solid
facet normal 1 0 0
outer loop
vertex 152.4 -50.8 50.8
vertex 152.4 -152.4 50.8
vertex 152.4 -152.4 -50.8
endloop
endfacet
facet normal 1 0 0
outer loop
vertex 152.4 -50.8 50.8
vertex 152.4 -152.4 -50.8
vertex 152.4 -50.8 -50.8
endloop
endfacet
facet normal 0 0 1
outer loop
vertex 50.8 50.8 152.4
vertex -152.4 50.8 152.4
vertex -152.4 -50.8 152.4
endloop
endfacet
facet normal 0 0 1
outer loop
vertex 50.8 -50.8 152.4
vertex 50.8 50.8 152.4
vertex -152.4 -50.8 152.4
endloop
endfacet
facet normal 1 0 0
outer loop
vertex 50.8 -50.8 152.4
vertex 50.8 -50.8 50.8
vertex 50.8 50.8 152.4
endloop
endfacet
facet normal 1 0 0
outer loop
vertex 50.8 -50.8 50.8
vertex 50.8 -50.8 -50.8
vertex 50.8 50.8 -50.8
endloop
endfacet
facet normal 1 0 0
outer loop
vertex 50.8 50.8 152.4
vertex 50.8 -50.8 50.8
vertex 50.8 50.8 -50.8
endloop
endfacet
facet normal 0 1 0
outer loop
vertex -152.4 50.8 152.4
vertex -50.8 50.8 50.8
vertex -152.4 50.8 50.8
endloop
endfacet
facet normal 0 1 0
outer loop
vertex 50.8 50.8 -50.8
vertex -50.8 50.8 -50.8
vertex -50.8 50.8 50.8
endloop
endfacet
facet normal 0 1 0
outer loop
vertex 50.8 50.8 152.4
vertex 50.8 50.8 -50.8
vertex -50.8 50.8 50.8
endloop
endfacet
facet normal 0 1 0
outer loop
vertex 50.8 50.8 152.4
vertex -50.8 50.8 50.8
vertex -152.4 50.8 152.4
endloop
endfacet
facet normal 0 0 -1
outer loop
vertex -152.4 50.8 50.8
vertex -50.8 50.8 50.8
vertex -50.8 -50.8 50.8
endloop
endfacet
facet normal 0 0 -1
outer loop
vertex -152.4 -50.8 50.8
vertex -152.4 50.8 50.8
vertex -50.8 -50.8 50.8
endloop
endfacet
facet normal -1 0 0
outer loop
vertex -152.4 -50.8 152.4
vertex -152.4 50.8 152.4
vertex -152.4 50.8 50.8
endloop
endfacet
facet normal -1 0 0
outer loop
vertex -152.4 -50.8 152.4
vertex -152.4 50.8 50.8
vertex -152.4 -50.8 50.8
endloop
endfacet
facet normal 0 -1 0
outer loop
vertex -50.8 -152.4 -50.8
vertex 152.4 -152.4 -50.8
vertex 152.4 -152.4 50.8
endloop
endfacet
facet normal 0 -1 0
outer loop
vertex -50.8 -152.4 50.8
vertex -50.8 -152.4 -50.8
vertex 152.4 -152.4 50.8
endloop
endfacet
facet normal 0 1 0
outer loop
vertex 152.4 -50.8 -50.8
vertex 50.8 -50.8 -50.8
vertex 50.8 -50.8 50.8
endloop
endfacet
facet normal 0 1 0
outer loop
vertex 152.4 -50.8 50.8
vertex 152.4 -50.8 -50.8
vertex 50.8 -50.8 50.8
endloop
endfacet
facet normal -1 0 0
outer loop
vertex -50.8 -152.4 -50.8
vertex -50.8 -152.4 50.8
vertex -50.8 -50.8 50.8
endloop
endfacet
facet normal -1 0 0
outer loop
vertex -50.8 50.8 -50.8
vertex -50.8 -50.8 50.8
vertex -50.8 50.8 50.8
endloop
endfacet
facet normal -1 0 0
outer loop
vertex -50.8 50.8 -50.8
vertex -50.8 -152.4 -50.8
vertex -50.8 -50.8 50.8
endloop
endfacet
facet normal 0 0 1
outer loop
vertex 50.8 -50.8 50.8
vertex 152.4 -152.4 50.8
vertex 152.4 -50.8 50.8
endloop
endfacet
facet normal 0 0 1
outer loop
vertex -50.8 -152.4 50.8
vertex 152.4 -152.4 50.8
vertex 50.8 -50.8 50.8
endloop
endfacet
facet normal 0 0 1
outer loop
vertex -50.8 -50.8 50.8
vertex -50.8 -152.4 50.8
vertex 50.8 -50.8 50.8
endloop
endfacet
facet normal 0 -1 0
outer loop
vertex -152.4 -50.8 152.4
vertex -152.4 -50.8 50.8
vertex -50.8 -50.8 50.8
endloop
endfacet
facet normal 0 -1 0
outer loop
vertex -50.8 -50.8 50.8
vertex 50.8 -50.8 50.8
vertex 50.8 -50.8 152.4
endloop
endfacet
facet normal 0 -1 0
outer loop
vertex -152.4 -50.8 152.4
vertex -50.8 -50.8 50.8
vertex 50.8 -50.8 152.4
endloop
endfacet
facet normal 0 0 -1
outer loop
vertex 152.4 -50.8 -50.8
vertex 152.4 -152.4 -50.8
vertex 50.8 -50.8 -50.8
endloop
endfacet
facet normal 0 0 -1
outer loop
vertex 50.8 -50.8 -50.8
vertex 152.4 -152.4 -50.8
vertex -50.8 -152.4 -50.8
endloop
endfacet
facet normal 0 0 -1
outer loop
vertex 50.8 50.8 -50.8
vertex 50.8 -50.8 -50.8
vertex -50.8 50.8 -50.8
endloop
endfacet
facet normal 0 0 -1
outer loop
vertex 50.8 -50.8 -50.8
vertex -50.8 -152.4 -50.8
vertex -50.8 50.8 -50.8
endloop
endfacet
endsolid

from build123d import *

# Parameters (mm, degrees)
F1_W      = 101.6
F1_H      = 101.6
F2_DEPTH  = 50.8
F3_W      = 101.6
F3_H      = 101.6
F4_DEPTH  = 101.6
F5_W      = 101.6
F5_H      = 101.6
F6_DEPTH  = 101.6
F7_W      = 101.6
F7_H      = 101.6
F8_DEPTH  = 101.6
F9_W      = 101.6
F9_H      = 101.6
F10_DEPTH = 101.6


# Not quite as in the source:
# - a variable given as a bare number and used for a length is read in inches; the dataset says mm whatever the document's units were


with BuildPart() as f2:
    # F1 (on Front) → F2 (new body, symmetric)
    with BuildSketch(Plane.XZ):
        Rectangle(F1_W, F1_H)
    extrude(amount=F2_DEPTH, both=True)

    # F3 (on face) → F4 (join)
    with BuildSketch(Plane.XZ.offset(50.8)):
        Rectangle(F3_W, F3_H)
    extrude(amount=F4_DEPTH)

    # F5 (on face) → F6 (join)
    with BuildSketch(Plane.YZ.offset(50.8)):
        with Locations((-101.6, 0)):
            Rectangle(F5_W, F5_H)
    extrude(amount=F6_DEPTH)

    # F7 (on face) → F8 (join)
    with BuildSketch(Plane.XY.offset(50.8)):
        Rectangle(F7_W, F7_H)
    extrude(amount=F8_DEPTH)

    # F9 (on face) → F10 (join)
    with BuildSketch(Plane(origin=(-50.8, 0, 0), x_dir=(0, -1, 0), z_dir=(-1, 0, 0))):
        with Locations((0, 101.6)):
            Rectangle(F9_W, F9_H)
    extrude(amount=F10_DEPTH)


solid = f2.part
